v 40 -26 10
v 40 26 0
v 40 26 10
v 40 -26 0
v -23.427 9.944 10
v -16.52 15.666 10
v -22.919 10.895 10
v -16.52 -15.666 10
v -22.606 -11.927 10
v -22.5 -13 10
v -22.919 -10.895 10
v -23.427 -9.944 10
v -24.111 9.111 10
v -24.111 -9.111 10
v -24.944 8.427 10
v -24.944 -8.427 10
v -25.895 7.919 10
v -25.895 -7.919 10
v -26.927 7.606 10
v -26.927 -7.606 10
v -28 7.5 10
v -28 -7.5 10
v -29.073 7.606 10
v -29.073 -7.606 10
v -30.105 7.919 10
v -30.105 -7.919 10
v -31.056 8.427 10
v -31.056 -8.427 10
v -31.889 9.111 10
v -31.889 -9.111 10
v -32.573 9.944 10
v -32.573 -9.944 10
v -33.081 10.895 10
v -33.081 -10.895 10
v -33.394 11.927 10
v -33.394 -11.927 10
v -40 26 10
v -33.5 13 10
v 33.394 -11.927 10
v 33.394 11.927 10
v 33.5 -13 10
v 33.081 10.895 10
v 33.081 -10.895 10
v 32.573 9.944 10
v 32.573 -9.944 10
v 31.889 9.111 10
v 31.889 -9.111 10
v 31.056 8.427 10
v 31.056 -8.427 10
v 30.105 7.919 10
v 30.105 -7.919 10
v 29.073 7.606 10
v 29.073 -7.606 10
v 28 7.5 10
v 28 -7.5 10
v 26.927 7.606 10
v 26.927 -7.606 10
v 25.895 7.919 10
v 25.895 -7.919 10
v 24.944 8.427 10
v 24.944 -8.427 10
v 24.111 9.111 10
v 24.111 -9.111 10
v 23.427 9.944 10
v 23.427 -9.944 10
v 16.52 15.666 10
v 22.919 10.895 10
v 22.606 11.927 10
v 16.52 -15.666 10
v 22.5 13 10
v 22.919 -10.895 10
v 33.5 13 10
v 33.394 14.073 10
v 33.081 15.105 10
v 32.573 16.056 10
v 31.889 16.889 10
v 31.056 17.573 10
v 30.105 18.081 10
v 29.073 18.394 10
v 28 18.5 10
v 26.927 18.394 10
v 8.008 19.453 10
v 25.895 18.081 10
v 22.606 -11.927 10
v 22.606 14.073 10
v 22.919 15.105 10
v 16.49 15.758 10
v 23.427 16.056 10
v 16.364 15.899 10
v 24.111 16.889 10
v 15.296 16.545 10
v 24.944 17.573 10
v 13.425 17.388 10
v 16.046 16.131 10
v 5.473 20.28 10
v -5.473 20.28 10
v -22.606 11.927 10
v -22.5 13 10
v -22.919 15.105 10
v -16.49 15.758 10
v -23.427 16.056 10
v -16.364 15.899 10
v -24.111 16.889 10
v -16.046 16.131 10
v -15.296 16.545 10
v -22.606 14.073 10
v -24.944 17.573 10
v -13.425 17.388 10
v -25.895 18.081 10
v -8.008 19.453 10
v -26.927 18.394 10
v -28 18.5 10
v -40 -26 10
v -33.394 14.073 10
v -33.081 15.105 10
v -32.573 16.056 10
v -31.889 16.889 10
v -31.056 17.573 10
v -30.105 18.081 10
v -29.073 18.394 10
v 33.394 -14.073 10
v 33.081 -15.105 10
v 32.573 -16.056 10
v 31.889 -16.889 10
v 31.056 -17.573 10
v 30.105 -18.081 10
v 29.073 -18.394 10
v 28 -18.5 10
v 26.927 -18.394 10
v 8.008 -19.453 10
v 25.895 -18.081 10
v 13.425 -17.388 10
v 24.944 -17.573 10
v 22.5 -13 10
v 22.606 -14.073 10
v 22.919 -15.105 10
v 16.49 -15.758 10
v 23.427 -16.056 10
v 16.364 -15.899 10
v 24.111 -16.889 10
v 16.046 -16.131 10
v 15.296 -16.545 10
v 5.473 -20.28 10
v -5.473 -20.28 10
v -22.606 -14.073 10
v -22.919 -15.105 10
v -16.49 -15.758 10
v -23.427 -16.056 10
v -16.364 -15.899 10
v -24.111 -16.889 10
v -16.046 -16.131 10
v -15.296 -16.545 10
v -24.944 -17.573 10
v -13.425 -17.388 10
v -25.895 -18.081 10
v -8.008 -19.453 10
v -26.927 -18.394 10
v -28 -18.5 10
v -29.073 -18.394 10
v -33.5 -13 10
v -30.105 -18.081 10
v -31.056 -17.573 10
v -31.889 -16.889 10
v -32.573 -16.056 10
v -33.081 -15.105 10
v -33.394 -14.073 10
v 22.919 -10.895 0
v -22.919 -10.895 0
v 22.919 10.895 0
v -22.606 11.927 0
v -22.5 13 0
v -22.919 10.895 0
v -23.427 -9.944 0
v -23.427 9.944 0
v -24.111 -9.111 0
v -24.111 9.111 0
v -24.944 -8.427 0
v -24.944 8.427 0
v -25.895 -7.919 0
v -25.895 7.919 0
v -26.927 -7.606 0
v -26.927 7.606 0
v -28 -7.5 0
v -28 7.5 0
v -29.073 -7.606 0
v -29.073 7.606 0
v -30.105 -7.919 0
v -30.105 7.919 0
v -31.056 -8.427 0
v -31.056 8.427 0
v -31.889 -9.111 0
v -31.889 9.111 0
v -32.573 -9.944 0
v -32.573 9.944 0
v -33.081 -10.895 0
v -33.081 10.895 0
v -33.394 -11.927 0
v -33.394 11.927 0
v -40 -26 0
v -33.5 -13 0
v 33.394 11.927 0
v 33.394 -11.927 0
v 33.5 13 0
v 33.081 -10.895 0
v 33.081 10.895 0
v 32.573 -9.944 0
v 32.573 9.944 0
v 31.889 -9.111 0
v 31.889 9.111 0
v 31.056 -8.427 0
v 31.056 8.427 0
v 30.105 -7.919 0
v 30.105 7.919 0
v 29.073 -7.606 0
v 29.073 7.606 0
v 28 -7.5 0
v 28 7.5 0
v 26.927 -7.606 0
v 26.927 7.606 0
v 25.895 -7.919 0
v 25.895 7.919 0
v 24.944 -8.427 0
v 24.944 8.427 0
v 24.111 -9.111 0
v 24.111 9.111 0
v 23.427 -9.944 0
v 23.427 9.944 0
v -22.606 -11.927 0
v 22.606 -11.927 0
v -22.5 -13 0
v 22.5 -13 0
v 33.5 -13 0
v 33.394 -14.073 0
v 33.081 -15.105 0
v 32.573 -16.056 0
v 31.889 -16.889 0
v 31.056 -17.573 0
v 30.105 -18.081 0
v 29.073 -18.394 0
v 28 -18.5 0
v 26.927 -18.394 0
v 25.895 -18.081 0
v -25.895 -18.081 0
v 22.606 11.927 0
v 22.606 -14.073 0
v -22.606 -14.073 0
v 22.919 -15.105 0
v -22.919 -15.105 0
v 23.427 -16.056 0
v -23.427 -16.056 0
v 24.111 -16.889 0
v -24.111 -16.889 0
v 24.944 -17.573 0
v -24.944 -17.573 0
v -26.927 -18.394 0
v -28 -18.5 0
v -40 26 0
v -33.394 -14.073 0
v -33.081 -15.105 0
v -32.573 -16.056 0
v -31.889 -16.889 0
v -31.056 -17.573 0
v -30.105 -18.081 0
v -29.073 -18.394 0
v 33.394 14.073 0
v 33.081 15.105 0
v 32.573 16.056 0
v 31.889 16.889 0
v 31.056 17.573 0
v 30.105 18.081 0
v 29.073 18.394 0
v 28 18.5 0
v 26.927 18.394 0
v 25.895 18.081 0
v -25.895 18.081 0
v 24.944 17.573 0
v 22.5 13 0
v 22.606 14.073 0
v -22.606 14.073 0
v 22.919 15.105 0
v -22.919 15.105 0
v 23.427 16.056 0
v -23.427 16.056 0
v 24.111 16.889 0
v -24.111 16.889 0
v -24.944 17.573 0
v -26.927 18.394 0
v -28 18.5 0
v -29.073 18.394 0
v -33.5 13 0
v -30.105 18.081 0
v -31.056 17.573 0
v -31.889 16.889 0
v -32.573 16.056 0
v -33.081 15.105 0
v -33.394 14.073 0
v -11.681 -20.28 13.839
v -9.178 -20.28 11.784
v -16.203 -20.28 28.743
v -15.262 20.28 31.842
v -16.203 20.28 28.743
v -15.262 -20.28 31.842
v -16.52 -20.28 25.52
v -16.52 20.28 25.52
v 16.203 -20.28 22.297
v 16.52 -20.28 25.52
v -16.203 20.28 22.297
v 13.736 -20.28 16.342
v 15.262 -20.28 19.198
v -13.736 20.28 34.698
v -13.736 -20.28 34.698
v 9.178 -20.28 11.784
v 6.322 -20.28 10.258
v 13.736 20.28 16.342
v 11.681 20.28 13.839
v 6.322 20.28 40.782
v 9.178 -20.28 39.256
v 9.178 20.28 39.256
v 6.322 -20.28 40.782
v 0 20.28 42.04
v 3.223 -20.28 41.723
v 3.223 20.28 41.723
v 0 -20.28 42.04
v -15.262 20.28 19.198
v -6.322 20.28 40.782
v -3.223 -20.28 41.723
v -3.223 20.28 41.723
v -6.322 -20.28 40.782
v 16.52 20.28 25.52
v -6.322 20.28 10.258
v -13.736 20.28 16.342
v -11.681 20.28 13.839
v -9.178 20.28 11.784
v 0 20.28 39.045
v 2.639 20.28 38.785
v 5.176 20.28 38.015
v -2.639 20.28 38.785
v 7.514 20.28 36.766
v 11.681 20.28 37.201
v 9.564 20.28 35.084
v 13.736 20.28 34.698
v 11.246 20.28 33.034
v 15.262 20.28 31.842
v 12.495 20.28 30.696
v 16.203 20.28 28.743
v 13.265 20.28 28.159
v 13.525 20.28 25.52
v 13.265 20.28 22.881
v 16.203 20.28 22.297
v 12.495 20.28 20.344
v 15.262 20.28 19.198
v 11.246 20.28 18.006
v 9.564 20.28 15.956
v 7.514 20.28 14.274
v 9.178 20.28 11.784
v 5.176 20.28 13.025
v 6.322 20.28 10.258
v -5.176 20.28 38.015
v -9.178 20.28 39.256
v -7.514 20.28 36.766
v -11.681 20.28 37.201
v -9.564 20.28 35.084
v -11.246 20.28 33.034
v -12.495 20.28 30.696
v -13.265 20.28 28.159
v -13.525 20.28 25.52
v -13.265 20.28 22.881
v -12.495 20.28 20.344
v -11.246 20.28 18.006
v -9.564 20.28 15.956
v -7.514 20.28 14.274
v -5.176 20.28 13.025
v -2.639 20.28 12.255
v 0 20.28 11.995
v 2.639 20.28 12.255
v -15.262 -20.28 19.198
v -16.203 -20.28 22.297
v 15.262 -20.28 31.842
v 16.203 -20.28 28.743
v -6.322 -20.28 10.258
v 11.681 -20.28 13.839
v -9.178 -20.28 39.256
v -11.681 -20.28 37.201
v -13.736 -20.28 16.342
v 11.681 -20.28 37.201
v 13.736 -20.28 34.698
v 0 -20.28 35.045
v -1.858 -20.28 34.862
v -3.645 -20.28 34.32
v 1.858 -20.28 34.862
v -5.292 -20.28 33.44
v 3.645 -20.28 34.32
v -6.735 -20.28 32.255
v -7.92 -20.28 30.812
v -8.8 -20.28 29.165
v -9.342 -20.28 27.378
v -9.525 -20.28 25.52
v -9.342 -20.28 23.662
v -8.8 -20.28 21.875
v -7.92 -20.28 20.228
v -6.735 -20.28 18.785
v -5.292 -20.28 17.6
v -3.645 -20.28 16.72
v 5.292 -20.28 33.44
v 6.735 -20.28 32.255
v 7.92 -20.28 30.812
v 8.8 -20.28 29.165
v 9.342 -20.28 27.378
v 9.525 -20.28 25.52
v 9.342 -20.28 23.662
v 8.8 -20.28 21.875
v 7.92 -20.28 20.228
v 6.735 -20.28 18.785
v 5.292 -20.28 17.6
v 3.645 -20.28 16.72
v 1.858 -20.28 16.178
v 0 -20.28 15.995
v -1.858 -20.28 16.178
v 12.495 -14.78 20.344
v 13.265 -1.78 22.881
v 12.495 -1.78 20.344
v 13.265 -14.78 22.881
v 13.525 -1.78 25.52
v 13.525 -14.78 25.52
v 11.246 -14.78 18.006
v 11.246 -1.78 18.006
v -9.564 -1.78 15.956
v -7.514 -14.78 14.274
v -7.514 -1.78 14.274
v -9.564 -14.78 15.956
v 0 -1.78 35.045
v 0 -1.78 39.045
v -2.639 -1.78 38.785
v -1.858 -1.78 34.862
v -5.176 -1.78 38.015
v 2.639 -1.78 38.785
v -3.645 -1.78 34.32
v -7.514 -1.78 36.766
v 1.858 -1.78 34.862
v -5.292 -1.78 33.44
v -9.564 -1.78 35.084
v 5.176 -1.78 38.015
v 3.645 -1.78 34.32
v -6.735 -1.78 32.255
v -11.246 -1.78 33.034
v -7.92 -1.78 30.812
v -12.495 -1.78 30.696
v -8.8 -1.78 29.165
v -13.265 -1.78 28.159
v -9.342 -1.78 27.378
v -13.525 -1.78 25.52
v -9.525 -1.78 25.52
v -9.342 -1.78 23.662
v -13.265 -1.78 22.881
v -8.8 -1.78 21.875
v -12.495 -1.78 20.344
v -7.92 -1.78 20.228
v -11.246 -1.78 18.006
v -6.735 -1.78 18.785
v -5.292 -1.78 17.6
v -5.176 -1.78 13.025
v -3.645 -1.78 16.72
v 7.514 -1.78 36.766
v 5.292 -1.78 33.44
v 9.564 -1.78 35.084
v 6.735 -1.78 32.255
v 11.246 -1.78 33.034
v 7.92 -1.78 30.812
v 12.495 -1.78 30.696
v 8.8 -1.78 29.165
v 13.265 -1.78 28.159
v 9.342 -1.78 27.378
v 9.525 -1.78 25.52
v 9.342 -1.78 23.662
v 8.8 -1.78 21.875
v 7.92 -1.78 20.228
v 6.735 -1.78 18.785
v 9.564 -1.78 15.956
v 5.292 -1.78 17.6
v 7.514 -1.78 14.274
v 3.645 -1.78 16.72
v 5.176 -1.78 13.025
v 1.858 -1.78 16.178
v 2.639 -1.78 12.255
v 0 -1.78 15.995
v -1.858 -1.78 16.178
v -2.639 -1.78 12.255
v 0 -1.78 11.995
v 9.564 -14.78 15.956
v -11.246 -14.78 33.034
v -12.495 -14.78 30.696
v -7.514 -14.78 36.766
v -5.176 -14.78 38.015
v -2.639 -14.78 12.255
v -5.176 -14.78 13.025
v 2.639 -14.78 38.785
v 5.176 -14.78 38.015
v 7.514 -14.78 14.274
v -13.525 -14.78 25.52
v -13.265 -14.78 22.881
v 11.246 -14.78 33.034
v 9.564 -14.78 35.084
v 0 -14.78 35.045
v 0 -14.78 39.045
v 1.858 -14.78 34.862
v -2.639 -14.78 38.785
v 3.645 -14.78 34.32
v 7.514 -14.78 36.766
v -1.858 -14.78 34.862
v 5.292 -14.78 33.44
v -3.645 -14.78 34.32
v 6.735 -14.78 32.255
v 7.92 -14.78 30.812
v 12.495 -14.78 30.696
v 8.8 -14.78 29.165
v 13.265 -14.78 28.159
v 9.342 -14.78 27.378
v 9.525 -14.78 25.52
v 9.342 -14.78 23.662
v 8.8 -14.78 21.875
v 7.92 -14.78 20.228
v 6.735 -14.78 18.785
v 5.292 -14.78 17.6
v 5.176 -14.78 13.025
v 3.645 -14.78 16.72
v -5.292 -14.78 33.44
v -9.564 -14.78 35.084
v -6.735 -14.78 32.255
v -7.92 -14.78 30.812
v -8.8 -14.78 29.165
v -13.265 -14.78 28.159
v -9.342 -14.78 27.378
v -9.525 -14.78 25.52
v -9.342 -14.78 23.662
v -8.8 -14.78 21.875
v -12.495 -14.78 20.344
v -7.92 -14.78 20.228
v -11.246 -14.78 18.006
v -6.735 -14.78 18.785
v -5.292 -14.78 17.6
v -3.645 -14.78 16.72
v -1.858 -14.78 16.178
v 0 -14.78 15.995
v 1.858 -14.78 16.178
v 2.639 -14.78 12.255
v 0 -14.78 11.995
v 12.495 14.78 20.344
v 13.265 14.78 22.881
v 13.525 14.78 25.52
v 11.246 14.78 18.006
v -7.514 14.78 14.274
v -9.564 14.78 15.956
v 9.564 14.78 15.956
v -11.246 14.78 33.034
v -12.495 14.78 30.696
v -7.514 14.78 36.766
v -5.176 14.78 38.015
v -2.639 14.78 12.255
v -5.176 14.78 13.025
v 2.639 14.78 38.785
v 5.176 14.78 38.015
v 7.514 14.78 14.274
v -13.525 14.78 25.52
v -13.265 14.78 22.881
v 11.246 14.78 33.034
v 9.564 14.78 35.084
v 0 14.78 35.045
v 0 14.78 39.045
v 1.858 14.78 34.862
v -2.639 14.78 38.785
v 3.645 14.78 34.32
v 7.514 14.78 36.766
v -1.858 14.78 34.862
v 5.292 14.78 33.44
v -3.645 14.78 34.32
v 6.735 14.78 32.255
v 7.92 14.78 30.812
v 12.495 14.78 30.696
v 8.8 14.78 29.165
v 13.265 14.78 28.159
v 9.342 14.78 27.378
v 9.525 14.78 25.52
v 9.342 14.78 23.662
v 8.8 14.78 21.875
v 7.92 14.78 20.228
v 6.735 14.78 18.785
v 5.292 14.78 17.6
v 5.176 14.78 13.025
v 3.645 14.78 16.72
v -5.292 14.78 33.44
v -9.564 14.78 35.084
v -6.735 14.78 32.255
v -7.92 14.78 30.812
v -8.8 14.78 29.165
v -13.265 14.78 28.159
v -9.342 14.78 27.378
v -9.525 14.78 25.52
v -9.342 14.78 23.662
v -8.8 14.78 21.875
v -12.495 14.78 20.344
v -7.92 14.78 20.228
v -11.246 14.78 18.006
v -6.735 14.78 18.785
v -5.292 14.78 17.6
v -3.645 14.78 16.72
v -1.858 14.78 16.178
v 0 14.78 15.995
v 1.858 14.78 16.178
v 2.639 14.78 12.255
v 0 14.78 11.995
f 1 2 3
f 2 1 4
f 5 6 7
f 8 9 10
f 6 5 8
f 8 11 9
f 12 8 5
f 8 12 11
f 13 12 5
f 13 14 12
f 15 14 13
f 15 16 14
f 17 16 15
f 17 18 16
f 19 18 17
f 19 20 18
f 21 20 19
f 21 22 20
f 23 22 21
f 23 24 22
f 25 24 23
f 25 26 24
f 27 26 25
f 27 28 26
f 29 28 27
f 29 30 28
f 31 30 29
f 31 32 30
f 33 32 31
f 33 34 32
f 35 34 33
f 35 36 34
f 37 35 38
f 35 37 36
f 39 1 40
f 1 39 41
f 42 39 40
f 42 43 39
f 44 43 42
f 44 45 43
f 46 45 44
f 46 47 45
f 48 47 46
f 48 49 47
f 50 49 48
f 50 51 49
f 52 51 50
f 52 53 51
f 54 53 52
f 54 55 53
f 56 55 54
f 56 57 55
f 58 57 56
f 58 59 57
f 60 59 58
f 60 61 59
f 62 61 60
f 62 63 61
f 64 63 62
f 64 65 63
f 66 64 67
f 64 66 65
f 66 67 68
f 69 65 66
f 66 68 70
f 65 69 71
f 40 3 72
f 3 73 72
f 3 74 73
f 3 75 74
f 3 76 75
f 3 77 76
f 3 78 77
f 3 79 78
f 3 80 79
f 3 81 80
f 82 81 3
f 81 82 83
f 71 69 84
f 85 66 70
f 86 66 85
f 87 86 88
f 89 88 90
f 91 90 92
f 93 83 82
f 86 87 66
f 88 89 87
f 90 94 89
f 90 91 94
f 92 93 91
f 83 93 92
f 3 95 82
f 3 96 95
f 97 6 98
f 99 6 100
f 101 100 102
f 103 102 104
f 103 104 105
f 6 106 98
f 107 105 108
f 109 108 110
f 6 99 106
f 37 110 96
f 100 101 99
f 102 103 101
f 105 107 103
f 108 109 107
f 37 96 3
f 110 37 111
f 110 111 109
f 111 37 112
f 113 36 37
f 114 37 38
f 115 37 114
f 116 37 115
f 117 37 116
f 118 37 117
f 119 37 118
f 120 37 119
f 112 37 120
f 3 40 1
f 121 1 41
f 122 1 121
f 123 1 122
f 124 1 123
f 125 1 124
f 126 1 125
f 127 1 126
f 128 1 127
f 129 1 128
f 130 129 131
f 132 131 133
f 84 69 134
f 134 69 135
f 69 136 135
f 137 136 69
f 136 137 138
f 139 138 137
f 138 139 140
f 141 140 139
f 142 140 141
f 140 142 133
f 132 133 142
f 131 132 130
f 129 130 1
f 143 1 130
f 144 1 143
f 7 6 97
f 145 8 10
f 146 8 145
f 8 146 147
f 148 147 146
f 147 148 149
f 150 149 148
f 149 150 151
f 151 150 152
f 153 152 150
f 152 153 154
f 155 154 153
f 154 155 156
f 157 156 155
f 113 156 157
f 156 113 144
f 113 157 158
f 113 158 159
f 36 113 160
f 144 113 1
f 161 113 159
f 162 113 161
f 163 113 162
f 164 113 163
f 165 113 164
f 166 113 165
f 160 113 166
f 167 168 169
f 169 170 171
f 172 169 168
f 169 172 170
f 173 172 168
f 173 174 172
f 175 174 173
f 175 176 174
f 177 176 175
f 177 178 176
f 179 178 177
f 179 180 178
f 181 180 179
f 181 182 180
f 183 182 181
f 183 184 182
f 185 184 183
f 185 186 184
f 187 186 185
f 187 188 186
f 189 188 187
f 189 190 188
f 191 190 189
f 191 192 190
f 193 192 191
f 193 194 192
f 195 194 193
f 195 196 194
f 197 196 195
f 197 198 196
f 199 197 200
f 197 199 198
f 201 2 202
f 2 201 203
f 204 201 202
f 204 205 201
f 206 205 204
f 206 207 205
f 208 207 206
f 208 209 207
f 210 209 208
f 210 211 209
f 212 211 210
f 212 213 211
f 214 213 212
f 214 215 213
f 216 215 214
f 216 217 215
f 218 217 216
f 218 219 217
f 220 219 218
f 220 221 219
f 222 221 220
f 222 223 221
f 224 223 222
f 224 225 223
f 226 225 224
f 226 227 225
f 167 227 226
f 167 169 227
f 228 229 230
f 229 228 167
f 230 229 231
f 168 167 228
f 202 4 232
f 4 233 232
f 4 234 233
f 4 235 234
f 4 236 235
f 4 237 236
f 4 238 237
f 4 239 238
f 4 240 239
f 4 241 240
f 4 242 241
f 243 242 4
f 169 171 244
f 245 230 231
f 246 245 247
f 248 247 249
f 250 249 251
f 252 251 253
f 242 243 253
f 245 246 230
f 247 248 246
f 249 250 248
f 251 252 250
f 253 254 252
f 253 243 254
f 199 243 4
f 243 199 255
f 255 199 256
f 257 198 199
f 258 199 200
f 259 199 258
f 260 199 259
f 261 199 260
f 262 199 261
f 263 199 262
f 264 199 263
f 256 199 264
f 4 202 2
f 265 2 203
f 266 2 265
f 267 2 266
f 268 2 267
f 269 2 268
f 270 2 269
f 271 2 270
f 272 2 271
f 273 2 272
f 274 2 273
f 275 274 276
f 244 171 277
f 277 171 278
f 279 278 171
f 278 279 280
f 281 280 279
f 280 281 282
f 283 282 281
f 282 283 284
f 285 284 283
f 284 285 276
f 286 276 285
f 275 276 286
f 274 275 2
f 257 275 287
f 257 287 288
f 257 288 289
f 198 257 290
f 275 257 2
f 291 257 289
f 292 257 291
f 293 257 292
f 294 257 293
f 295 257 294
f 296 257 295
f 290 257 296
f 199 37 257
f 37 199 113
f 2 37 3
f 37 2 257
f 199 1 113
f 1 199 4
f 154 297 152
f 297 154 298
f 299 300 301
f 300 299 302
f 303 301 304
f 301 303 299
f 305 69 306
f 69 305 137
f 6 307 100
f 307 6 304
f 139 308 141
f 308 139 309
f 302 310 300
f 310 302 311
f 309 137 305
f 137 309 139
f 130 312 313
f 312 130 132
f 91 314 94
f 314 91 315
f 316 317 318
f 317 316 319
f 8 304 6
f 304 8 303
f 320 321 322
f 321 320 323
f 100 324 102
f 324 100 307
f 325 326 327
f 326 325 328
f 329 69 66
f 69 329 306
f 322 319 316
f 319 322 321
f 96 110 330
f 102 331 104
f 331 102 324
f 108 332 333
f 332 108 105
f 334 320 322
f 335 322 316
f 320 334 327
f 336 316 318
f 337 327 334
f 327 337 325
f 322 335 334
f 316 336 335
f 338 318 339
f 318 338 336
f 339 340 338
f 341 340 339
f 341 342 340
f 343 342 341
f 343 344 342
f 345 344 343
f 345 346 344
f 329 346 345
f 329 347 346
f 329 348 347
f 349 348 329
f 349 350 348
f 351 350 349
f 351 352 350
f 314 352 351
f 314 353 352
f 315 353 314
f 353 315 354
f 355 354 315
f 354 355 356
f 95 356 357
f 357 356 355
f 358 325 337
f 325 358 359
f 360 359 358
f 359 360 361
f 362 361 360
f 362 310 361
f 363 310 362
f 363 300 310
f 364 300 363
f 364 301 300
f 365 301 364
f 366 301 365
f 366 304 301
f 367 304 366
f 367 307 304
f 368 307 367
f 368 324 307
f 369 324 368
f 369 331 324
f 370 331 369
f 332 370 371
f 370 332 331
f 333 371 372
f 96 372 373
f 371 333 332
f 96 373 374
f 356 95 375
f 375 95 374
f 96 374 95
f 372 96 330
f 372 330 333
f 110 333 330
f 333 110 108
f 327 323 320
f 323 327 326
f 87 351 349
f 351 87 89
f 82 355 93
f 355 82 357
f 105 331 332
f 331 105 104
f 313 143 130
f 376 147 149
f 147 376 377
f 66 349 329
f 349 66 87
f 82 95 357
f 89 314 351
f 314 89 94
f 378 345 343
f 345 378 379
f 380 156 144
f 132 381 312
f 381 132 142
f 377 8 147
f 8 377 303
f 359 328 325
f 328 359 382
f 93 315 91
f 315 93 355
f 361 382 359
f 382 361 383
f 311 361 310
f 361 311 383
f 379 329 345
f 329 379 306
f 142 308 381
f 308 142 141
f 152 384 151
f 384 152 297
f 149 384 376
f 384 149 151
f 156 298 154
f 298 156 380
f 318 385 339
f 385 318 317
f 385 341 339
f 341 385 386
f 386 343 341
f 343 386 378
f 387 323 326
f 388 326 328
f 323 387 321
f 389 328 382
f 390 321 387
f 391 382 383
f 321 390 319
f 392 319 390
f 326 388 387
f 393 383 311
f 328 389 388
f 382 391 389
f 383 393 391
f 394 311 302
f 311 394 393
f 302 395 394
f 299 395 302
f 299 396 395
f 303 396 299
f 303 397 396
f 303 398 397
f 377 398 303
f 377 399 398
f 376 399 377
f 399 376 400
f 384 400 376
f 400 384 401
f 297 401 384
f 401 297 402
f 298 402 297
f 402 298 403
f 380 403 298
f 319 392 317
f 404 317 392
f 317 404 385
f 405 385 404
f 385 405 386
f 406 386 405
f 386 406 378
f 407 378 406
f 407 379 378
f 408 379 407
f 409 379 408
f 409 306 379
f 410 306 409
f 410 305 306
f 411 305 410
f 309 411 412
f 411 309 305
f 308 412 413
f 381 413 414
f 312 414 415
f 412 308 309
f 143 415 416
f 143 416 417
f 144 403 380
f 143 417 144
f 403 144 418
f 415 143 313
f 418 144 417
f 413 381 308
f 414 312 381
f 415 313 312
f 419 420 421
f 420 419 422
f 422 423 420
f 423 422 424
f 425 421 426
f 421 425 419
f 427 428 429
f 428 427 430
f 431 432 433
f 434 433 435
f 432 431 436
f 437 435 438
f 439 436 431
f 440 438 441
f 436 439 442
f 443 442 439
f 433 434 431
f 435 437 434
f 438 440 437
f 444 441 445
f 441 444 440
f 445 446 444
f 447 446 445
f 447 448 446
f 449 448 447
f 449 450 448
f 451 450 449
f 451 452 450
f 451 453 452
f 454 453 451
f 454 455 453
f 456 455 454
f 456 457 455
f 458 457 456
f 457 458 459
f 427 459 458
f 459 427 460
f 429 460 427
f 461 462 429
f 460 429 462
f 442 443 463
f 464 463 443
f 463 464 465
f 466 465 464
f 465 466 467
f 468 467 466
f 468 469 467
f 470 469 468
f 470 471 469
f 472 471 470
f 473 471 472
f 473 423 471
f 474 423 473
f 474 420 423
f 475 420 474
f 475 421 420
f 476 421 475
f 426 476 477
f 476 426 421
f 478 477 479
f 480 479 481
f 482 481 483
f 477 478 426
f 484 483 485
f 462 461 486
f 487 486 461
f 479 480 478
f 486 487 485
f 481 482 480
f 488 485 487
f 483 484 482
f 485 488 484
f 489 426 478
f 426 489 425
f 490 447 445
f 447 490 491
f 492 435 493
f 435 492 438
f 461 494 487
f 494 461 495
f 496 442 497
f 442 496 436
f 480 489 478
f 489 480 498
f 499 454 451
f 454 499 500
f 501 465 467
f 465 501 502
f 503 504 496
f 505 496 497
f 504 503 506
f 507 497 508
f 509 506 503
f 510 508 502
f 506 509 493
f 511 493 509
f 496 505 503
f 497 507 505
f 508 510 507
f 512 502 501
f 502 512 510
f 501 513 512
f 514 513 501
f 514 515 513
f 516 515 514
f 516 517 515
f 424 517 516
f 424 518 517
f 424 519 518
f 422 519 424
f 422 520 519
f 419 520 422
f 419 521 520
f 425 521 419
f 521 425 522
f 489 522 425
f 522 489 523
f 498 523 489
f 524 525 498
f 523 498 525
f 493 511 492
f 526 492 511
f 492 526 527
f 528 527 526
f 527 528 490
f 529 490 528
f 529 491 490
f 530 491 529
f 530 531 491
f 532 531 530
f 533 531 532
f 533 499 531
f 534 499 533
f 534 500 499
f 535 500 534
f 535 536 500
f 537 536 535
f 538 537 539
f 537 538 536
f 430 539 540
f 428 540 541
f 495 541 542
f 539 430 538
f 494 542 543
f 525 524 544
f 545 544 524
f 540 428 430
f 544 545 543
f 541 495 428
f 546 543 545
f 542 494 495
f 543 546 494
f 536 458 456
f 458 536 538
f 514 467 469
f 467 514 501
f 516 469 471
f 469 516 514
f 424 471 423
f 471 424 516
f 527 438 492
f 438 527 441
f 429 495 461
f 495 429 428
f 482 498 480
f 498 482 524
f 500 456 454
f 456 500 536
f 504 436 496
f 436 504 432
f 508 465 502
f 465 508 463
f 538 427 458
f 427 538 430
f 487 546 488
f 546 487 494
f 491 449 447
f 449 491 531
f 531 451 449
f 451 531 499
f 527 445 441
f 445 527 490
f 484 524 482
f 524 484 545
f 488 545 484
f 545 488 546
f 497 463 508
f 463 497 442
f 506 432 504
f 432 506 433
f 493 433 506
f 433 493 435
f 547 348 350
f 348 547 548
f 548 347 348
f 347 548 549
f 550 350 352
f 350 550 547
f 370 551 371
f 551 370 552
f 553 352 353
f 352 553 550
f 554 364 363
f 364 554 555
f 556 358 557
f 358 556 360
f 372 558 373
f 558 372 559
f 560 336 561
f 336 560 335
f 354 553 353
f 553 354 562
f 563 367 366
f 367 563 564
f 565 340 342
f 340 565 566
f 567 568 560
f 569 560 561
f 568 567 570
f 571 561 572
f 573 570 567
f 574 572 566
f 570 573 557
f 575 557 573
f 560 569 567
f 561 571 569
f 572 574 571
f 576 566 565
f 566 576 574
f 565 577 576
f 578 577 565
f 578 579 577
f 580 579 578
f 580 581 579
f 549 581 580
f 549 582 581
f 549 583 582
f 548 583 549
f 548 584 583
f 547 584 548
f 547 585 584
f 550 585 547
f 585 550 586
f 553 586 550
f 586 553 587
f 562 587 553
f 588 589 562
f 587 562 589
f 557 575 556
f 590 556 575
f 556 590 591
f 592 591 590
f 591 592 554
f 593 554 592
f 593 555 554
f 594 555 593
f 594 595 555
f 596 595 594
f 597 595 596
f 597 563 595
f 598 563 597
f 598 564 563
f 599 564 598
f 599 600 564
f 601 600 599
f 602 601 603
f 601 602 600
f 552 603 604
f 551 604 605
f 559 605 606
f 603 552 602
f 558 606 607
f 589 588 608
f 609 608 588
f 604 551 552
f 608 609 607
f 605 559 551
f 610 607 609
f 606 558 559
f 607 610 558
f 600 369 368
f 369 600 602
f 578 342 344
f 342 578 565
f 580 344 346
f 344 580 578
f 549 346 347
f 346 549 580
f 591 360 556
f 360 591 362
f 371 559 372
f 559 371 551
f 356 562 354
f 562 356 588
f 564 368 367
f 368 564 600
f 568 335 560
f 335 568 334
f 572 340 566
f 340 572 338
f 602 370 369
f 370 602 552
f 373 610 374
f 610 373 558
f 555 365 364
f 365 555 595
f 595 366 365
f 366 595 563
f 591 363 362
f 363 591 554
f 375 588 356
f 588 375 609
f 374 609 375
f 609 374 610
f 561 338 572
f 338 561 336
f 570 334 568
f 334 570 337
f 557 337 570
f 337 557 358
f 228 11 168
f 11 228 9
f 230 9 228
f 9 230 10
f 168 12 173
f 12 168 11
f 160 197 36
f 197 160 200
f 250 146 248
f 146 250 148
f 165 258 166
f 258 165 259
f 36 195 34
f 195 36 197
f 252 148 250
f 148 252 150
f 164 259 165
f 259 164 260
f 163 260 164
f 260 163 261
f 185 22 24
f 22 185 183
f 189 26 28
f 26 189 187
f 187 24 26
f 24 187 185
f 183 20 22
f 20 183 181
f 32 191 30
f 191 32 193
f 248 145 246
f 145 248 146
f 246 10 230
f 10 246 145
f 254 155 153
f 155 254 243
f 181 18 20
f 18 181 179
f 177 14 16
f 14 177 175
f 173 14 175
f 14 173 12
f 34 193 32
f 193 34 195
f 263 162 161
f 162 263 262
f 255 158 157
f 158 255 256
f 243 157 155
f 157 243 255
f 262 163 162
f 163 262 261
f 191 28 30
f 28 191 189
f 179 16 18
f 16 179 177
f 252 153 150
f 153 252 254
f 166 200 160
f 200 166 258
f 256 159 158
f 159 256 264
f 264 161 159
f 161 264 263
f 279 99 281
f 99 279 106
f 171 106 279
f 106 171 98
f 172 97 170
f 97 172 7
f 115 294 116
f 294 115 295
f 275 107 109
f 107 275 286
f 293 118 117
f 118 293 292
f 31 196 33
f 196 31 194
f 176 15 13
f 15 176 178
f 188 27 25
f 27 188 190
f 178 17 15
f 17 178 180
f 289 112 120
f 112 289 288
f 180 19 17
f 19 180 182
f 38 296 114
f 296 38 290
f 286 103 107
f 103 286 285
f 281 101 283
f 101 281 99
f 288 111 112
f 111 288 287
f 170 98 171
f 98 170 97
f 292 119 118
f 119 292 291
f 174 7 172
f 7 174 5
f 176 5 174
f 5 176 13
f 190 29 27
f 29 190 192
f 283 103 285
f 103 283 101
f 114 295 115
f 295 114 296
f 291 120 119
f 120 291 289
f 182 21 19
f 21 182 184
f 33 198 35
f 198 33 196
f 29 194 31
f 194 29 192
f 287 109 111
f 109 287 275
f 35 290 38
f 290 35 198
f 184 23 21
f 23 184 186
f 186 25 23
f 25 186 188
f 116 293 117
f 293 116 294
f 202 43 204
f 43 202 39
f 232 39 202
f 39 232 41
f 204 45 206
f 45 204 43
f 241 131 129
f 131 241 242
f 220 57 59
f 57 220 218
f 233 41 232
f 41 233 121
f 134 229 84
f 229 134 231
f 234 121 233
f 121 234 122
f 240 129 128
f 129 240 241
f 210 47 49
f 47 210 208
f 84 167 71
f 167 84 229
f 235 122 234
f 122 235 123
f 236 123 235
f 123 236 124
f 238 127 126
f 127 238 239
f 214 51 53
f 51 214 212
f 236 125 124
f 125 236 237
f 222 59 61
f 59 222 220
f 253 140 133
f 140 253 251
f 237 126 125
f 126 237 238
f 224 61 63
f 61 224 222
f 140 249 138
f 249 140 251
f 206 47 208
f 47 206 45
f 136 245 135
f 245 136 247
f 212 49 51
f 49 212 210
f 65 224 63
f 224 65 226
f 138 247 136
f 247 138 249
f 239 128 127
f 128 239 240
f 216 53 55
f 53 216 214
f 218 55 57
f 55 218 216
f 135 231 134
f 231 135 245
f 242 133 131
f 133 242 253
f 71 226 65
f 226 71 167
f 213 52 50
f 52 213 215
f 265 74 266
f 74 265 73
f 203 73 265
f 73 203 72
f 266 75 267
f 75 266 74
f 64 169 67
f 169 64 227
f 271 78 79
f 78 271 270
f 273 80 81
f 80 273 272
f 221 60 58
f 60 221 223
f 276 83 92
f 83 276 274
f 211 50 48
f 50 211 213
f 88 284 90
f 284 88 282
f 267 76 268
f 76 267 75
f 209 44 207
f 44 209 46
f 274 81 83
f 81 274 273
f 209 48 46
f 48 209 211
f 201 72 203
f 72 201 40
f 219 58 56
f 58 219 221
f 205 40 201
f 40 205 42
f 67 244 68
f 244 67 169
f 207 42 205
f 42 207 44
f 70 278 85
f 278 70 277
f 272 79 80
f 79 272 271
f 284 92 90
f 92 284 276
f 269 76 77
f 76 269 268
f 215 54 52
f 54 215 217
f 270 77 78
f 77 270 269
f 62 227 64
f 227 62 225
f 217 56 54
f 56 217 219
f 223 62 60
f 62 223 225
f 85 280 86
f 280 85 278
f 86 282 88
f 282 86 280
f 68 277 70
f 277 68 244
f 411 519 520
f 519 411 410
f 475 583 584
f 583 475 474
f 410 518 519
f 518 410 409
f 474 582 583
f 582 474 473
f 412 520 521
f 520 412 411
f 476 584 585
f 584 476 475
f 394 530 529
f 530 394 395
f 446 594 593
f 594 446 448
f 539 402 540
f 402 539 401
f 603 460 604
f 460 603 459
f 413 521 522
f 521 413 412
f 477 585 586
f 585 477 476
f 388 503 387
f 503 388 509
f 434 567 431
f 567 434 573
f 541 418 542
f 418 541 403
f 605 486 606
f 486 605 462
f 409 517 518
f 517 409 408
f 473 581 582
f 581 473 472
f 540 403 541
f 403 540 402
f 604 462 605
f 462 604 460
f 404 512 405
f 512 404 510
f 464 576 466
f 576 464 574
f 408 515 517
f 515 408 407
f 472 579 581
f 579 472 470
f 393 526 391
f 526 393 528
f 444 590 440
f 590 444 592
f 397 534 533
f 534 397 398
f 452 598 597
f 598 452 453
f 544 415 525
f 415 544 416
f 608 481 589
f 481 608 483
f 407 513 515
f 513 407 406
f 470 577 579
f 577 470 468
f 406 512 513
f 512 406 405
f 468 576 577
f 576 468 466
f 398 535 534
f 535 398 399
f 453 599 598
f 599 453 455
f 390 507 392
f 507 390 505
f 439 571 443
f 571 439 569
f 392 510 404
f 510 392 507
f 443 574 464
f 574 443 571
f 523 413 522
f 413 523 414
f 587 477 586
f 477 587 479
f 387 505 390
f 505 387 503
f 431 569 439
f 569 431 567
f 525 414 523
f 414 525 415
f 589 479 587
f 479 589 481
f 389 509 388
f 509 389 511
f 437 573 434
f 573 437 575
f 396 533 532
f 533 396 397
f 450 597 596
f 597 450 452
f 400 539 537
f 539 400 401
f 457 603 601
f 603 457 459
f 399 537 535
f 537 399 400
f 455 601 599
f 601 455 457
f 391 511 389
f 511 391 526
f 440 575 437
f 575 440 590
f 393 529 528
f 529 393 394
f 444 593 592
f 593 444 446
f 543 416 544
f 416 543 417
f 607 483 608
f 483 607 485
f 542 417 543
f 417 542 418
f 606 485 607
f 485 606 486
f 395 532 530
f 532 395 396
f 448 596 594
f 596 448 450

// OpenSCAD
$fn = 32;

// ----------------------------------------------------------------------
// Bearing block: 80 x 52 mm base, 19.05 mm bore at 25.52 mm
// ----------------------------------------------------------------------

// --- parameters (mm) ---
base_w = 80;              // base width
base_d = 52;              // base depth
base_t = 10;              // base thickness
bore_d = 19.05;           // shaft / bearing bore
house_r = 16.52;          // housing outer radius
house_len = 40.56;        // housing length along the shaft
foot_w = 33.04;           // foot width under the housing
foot_len = 30.56;         // foot length along the shaft
axis_z = 25.52;           // bore axis height above the base
holes_d = 11;             // mounting holes
hole_x = 28;              // mounting hole spacing
seat_d = 8;               // bearing seat depth
seat_wall = 4;            // seat wall thickness

difference() {
  union() {
    /* base plate with its underside on z = 0 */
    translate([0, 0, base_t / 2]) cube([base_w, base_d, base_t], center = true);
    /* hull foot: a straight web blending into the round housing */
    hull() {
      translate([0, 0, base_t - 0.5]) cube([foot_w, foot_len, 1.6], center = true);
      translate([0, 0, axis_z]) rotate([-90, 0, 0]) cylinder(h = house_len, d = 2 * house_r, center = true);
    }
  }
  /* bore through the housing, 2.5 mm clear on both sides */
  translate([0, 0, axis_z]) rotate([-90, 0, 0]) cylinder(h = house_len + 5, d = bore_d, center = true);
  /* bearing seats, recessed into both ends of the housing */
  for (sy = [-1, 1]) {
    translate([0, sy * (house_len / 2 - seat_d + 2.5), axis_z]) rotate([-90, 0, 0]) cylinder(h = seat_d + 5, d = bore_d + 2 * seat_wall);
  }
  /* mounting holes through the base plate */
  for (hx = [-28, 28]) {
    for (hy = [-13, 13]) {
      translate([hx, hy, -2.5]) cylinder(h = base_t + 5, d = holes_d);
    }
  }
}
